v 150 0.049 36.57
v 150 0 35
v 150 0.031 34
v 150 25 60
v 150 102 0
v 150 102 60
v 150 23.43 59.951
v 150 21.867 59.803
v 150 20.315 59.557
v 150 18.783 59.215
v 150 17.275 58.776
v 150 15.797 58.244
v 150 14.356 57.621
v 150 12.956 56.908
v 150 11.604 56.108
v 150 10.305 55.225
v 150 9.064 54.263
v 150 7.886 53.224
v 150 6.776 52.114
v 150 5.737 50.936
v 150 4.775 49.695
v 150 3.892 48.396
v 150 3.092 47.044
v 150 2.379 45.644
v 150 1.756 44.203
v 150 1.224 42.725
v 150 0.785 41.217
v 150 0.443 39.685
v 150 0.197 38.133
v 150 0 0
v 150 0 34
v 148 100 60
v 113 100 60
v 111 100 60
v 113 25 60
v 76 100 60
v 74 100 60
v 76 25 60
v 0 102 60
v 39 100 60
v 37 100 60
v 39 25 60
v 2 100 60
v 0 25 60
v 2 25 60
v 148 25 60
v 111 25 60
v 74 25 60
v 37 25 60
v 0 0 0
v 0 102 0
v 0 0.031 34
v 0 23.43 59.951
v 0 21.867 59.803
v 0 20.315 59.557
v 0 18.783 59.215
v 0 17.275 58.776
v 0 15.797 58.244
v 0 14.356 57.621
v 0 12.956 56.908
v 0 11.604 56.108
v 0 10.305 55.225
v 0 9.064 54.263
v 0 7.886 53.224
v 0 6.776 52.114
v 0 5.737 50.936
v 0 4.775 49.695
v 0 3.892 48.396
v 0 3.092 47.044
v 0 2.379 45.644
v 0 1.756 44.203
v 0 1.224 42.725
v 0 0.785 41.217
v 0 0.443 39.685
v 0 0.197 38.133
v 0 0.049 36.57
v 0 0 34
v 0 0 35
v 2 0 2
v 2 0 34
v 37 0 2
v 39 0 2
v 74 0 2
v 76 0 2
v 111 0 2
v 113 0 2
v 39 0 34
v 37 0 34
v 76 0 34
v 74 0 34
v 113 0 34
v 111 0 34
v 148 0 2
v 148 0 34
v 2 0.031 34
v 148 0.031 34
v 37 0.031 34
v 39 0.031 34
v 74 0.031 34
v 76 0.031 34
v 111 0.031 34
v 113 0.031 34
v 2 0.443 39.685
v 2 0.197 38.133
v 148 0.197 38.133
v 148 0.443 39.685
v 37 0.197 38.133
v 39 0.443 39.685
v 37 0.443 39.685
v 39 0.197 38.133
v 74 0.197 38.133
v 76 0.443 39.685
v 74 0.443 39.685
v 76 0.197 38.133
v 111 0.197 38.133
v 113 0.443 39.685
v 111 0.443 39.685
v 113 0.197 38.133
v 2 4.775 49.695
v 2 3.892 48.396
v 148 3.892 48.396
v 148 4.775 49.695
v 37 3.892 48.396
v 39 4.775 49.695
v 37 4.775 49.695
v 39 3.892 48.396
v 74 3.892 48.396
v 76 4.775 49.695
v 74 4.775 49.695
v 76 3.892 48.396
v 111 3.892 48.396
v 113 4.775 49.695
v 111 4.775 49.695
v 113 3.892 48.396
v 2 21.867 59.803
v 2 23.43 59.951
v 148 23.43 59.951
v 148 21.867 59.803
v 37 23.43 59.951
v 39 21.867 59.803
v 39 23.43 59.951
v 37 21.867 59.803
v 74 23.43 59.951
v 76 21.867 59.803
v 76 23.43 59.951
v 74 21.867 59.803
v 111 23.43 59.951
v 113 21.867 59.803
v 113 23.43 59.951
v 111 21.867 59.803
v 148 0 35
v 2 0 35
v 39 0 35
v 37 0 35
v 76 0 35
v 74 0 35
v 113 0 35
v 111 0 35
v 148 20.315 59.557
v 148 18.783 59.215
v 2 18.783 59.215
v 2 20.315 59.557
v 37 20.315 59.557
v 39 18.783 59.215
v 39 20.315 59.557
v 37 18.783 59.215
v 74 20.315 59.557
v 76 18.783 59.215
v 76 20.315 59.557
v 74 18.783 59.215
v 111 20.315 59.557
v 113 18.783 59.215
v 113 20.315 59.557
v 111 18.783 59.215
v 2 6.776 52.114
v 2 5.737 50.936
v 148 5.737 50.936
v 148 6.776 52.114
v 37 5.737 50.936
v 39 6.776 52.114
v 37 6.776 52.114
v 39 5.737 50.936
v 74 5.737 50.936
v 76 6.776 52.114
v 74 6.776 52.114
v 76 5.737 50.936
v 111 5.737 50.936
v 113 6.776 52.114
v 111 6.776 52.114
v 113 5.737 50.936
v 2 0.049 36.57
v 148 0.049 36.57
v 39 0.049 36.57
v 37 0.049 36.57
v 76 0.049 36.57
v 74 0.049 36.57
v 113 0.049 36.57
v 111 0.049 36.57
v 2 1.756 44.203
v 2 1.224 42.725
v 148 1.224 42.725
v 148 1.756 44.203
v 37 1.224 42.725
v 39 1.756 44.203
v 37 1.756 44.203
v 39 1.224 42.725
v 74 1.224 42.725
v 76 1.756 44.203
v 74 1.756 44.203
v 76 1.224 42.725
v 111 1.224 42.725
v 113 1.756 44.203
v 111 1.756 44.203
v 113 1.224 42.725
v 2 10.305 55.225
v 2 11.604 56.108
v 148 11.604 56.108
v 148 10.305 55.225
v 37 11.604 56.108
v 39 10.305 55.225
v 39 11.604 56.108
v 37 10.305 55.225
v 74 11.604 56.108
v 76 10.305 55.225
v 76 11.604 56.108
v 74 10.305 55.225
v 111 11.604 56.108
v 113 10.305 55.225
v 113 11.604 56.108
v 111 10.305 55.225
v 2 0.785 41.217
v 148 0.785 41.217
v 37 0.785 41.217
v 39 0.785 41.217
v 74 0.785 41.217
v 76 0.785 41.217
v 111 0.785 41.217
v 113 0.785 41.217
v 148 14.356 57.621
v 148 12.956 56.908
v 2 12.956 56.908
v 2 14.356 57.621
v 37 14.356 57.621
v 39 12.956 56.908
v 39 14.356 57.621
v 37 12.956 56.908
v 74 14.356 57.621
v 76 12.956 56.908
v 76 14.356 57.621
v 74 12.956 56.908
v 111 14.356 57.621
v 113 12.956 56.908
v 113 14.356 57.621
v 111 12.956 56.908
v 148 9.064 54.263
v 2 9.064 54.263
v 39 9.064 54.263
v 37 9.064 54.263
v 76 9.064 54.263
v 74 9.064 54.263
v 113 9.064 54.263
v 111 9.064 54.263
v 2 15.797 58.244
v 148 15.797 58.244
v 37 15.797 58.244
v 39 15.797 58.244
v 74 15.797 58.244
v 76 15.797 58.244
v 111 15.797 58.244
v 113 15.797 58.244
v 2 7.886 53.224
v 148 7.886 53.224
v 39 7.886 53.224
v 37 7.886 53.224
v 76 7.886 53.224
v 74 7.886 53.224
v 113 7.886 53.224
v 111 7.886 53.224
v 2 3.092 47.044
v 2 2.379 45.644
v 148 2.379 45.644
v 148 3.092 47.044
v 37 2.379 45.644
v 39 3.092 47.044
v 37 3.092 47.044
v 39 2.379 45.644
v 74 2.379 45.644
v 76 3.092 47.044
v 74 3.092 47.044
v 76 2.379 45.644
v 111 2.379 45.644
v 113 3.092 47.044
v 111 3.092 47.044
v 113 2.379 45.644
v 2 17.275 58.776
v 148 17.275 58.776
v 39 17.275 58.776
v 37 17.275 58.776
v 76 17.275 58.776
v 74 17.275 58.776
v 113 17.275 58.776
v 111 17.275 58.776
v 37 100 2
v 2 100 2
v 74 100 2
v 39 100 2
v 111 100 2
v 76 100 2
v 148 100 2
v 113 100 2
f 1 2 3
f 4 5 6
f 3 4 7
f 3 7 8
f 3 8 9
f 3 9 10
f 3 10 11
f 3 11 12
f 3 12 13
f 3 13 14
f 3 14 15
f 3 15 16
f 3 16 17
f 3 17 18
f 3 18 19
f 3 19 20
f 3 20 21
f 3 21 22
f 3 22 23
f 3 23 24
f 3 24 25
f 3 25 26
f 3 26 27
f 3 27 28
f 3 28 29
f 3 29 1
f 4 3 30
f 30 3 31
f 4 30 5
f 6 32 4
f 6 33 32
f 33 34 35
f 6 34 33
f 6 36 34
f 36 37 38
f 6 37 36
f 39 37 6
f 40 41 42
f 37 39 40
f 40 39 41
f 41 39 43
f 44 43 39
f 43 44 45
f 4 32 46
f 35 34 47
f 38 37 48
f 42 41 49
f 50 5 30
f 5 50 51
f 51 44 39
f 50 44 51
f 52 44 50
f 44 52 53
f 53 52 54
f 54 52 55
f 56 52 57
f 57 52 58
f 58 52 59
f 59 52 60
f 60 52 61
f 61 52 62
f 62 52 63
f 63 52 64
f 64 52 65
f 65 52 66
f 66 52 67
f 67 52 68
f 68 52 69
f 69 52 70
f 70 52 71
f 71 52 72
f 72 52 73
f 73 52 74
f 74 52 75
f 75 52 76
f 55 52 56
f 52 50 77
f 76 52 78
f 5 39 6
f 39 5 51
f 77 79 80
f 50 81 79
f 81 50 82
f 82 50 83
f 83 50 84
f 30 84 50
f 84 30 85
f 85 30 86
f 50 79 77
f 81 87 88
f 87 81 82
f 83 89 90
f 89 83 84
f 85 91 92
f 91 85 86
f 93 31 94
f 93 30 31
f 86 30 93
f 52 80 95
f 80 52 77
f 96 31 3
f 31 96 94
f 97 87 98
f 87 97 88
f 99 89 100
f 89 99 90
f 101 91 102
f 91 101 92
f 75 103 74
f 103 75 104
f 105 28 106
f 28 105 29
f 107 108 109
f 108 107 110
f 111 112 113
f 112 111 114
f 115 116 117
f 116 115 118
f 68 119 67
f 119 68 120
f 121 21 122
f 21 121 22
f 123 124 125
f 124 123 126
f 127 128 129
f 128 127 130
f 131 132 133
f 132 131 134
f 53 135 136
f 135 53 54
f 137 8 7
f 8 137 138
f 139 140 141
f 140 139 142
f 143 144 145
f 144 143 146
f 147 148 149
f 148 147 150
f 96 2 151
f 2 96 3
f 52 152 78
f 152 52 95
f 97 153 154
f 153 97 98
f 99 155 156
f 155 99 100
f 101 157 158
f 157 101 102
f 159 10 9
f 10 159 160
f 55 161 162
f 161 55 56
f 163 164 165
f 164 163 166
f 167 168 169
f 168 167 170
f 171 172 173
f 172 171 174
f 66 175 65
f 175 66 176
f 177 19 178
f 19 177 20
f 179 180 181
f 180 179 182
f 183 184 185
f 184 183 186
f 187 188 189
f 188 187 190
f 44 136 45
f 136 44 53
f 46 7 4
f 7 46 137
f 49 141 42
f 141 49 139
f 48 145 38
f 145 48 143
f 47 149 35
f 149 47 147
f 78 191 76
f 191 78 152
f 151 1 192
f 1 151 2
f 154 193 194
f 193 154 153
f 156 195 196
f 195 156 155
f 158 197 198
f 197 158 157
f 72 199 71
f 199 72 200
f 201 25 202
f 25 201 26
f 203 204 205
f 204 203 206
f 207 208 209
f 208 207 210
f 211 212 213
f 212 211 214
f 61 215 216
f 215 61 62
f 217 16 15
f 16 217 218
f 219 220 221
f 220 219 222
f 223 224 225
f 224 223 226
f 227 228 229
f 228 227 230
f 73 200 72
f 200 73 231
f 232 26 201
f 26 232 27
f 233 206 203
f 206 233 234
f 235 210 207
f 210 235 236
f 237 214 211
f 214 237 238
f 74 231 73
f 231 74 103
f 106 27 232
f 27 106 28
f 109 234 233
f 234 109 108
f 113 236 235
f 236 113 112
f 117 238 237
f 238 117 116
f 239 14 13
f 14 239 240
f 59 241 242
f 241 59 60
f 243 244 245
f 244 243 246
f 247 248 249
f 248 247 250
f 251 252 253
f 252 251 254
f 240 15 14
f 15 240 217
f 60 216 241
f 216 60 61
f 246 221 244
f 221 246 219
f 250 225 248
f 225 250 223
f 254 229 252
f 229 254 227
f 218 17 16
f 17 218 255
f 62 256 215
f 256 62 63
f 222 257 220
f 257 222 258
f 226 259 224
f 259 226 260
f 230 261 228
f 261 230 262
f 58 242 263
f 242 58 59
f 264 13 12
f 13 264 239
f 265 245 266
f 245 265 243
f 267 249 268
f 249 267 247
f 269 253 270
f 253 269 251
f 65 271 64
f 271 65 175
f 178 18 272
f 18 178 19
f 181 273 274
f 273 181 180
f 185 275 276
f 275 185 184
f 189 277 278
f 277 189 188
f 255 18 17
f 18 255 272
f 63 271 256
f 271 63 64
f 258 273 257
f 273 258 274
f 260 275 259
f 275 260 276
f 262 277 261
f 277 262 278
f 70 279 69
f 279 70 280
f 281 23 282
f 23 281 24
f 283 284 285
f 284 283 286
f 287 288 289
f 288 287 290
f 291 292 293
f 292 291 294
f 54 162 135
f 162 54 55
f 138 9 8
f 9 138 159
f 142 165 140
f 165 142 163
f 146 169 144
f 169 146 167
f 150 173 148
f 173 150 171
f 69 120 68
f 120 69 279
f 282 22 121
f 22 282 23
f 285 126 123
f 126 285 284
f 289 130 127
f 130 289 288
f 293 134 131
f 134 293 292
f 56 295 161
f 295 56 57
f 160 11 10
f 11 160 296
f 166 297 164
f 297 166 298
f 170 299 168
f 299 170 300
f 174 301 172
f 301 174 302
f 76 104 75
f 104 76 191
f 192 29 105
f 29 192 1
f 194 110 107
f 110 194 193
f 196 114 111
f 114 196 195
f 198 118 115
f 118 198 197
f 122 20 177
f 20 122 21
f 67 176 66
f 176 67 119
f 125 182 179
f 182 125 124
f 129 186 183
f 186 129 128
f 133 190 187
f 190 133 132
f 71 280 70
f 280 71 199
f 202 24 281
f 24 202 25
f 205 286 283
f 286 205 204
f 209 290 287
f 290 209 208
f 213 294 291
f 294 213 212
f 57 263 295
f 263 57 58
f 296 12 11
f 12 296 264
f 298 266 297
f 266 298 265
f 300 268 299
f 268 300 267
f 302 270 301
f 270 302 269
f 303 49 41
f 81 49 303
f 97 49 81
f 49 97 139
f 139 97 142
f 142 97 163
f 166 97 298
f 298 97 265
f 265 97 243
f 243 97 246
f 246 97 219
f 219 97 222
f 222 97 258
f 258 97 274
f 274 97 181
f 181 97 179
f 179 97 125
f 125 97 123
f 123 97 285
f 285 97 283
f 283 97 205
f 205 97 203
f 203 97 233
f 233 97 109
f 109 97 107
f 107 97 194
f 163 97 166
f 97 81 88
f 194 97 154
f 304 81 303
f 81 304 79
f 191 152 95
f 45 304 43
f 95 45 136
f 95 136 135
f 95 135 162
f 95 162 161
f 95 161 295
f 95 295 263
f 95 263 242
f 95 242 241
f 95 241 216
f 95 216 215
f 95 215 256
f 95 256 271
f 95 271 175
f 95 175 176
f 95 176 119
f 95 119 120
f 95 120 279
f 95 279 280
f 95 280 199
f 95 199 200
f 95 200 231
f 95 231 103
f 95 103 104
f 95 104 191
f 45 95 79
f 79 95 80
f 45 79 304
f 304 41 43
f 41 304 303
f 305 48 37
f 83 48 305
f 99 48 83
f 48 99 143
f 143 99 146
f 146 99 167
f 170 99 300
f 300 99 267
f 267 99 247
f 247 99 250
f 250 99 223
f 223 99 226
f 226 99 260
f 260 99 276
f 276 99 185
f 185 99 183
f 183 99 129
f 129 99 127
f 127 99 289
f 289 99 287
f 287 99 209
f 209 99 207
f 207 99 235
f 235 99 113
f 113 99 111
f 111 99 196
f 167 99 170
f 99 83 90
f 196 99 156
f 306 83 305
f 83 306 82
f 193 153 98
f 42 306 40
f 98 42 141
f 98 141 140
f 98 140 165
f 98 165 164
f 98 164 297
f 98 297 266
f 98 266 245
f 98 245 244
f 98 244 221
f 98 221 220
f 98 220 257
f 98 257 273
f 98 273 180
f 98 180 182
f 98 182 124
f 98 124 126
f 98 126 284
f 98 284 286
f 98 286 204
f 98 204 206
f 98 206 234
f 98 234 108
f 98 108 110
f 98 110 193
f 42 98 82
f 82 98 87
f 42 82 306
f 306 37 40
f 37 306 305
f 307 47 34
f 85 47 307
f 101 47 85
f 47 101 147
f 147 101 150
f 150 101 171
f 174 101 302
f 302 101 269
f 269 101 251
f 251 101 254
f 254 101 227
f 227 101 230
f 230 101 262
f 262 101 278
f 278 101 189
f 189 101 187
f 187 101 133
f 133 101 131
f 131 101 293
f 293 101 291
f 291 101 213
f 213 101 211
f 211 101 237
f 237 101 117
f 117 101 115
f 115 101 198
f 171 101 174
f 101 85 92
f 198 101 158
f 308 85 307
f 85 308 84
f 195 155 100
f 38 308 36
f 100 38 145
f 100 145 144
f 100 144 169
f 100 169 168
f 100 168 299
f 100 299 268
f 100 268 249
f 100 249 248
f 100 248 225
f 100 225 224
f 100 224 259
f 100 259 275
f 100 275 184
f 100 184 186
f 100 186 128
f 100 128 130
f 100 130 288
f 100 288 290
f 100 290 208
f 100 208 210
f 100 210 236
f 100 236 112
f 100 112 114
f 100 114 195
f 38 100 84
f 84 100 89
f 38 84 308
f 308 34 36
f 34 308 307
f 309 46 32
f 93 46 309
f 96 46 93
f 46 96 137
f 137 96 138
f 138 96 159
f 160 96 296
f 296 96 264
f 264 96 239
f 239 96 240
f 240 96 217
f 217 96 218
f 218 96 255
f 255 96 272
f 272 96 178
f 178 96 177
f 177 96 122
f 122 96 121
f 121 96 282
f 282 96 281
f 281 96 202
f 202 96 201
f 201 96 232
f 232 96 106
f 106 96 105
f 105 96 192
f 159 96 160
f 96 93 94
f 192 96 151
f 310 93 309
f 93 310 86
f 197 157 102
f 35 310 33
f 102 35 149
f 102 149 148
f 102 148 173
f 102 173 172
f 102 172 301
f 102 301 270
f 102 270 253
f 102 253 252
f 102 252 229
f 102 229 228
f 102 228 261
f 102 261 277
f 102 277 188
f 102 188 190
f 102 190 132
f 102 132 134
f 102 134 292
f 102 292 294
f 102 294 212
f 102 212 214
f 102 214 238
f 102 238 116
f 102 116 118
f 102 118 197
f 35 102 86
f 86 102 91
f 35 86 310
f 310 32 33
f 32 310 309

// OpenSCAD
nBags = 4;
bagW = 35;
bagD = 100;
wall = 2;

w =  nBags * bagW + (nBags + 1) * wall;
h = 60;
d = bagD + wall;

curveH = 25;
curveSides = 100;

difference() {
    union() {
        difference() {
            cube([w, d, h]);
            translate([-1, -1, h - curveH - 1])
                cube([w + 2, curveH + 1, h + 1]);
        }
        translate([0, curveH, h - curveH])
            rotate([0, 90, 0])
                cylinder(d = 2 * curveH, h = w, $fn = curveSides);
    }
    for(i=[0:nBags-1]) {
        translate([wall + (i * (bagW + wall)), -1, wall])
            cube([bagW, bagD + 1, h]);
    }
}

/*
translate([w + 10, 0, 0]) {
    difference() {
        union() {
            difference() {
                cube([w, d, h]);
                translate([-1, -1, h - curveH - 1])
                    cube([w + 2, curveH + 1, h + 1]);
            }
            translate([0, curveH, h - curveH])
                rotate([0, 90, 0])
                    cylinder(d = 2 * curveH, h = w, $fn = curveSides);
        }
        for(i=[0:nBags-1]) {
            translate([wall + (i * (bagW + wall)), -1, wall])
                cube([bagW, bagD + 1, h]);
        }
        translate([2 * wall + bagW, -1, -1])
            cube([1000, 1000, 1000]);        
    }
}
*/

echo(w);
    
